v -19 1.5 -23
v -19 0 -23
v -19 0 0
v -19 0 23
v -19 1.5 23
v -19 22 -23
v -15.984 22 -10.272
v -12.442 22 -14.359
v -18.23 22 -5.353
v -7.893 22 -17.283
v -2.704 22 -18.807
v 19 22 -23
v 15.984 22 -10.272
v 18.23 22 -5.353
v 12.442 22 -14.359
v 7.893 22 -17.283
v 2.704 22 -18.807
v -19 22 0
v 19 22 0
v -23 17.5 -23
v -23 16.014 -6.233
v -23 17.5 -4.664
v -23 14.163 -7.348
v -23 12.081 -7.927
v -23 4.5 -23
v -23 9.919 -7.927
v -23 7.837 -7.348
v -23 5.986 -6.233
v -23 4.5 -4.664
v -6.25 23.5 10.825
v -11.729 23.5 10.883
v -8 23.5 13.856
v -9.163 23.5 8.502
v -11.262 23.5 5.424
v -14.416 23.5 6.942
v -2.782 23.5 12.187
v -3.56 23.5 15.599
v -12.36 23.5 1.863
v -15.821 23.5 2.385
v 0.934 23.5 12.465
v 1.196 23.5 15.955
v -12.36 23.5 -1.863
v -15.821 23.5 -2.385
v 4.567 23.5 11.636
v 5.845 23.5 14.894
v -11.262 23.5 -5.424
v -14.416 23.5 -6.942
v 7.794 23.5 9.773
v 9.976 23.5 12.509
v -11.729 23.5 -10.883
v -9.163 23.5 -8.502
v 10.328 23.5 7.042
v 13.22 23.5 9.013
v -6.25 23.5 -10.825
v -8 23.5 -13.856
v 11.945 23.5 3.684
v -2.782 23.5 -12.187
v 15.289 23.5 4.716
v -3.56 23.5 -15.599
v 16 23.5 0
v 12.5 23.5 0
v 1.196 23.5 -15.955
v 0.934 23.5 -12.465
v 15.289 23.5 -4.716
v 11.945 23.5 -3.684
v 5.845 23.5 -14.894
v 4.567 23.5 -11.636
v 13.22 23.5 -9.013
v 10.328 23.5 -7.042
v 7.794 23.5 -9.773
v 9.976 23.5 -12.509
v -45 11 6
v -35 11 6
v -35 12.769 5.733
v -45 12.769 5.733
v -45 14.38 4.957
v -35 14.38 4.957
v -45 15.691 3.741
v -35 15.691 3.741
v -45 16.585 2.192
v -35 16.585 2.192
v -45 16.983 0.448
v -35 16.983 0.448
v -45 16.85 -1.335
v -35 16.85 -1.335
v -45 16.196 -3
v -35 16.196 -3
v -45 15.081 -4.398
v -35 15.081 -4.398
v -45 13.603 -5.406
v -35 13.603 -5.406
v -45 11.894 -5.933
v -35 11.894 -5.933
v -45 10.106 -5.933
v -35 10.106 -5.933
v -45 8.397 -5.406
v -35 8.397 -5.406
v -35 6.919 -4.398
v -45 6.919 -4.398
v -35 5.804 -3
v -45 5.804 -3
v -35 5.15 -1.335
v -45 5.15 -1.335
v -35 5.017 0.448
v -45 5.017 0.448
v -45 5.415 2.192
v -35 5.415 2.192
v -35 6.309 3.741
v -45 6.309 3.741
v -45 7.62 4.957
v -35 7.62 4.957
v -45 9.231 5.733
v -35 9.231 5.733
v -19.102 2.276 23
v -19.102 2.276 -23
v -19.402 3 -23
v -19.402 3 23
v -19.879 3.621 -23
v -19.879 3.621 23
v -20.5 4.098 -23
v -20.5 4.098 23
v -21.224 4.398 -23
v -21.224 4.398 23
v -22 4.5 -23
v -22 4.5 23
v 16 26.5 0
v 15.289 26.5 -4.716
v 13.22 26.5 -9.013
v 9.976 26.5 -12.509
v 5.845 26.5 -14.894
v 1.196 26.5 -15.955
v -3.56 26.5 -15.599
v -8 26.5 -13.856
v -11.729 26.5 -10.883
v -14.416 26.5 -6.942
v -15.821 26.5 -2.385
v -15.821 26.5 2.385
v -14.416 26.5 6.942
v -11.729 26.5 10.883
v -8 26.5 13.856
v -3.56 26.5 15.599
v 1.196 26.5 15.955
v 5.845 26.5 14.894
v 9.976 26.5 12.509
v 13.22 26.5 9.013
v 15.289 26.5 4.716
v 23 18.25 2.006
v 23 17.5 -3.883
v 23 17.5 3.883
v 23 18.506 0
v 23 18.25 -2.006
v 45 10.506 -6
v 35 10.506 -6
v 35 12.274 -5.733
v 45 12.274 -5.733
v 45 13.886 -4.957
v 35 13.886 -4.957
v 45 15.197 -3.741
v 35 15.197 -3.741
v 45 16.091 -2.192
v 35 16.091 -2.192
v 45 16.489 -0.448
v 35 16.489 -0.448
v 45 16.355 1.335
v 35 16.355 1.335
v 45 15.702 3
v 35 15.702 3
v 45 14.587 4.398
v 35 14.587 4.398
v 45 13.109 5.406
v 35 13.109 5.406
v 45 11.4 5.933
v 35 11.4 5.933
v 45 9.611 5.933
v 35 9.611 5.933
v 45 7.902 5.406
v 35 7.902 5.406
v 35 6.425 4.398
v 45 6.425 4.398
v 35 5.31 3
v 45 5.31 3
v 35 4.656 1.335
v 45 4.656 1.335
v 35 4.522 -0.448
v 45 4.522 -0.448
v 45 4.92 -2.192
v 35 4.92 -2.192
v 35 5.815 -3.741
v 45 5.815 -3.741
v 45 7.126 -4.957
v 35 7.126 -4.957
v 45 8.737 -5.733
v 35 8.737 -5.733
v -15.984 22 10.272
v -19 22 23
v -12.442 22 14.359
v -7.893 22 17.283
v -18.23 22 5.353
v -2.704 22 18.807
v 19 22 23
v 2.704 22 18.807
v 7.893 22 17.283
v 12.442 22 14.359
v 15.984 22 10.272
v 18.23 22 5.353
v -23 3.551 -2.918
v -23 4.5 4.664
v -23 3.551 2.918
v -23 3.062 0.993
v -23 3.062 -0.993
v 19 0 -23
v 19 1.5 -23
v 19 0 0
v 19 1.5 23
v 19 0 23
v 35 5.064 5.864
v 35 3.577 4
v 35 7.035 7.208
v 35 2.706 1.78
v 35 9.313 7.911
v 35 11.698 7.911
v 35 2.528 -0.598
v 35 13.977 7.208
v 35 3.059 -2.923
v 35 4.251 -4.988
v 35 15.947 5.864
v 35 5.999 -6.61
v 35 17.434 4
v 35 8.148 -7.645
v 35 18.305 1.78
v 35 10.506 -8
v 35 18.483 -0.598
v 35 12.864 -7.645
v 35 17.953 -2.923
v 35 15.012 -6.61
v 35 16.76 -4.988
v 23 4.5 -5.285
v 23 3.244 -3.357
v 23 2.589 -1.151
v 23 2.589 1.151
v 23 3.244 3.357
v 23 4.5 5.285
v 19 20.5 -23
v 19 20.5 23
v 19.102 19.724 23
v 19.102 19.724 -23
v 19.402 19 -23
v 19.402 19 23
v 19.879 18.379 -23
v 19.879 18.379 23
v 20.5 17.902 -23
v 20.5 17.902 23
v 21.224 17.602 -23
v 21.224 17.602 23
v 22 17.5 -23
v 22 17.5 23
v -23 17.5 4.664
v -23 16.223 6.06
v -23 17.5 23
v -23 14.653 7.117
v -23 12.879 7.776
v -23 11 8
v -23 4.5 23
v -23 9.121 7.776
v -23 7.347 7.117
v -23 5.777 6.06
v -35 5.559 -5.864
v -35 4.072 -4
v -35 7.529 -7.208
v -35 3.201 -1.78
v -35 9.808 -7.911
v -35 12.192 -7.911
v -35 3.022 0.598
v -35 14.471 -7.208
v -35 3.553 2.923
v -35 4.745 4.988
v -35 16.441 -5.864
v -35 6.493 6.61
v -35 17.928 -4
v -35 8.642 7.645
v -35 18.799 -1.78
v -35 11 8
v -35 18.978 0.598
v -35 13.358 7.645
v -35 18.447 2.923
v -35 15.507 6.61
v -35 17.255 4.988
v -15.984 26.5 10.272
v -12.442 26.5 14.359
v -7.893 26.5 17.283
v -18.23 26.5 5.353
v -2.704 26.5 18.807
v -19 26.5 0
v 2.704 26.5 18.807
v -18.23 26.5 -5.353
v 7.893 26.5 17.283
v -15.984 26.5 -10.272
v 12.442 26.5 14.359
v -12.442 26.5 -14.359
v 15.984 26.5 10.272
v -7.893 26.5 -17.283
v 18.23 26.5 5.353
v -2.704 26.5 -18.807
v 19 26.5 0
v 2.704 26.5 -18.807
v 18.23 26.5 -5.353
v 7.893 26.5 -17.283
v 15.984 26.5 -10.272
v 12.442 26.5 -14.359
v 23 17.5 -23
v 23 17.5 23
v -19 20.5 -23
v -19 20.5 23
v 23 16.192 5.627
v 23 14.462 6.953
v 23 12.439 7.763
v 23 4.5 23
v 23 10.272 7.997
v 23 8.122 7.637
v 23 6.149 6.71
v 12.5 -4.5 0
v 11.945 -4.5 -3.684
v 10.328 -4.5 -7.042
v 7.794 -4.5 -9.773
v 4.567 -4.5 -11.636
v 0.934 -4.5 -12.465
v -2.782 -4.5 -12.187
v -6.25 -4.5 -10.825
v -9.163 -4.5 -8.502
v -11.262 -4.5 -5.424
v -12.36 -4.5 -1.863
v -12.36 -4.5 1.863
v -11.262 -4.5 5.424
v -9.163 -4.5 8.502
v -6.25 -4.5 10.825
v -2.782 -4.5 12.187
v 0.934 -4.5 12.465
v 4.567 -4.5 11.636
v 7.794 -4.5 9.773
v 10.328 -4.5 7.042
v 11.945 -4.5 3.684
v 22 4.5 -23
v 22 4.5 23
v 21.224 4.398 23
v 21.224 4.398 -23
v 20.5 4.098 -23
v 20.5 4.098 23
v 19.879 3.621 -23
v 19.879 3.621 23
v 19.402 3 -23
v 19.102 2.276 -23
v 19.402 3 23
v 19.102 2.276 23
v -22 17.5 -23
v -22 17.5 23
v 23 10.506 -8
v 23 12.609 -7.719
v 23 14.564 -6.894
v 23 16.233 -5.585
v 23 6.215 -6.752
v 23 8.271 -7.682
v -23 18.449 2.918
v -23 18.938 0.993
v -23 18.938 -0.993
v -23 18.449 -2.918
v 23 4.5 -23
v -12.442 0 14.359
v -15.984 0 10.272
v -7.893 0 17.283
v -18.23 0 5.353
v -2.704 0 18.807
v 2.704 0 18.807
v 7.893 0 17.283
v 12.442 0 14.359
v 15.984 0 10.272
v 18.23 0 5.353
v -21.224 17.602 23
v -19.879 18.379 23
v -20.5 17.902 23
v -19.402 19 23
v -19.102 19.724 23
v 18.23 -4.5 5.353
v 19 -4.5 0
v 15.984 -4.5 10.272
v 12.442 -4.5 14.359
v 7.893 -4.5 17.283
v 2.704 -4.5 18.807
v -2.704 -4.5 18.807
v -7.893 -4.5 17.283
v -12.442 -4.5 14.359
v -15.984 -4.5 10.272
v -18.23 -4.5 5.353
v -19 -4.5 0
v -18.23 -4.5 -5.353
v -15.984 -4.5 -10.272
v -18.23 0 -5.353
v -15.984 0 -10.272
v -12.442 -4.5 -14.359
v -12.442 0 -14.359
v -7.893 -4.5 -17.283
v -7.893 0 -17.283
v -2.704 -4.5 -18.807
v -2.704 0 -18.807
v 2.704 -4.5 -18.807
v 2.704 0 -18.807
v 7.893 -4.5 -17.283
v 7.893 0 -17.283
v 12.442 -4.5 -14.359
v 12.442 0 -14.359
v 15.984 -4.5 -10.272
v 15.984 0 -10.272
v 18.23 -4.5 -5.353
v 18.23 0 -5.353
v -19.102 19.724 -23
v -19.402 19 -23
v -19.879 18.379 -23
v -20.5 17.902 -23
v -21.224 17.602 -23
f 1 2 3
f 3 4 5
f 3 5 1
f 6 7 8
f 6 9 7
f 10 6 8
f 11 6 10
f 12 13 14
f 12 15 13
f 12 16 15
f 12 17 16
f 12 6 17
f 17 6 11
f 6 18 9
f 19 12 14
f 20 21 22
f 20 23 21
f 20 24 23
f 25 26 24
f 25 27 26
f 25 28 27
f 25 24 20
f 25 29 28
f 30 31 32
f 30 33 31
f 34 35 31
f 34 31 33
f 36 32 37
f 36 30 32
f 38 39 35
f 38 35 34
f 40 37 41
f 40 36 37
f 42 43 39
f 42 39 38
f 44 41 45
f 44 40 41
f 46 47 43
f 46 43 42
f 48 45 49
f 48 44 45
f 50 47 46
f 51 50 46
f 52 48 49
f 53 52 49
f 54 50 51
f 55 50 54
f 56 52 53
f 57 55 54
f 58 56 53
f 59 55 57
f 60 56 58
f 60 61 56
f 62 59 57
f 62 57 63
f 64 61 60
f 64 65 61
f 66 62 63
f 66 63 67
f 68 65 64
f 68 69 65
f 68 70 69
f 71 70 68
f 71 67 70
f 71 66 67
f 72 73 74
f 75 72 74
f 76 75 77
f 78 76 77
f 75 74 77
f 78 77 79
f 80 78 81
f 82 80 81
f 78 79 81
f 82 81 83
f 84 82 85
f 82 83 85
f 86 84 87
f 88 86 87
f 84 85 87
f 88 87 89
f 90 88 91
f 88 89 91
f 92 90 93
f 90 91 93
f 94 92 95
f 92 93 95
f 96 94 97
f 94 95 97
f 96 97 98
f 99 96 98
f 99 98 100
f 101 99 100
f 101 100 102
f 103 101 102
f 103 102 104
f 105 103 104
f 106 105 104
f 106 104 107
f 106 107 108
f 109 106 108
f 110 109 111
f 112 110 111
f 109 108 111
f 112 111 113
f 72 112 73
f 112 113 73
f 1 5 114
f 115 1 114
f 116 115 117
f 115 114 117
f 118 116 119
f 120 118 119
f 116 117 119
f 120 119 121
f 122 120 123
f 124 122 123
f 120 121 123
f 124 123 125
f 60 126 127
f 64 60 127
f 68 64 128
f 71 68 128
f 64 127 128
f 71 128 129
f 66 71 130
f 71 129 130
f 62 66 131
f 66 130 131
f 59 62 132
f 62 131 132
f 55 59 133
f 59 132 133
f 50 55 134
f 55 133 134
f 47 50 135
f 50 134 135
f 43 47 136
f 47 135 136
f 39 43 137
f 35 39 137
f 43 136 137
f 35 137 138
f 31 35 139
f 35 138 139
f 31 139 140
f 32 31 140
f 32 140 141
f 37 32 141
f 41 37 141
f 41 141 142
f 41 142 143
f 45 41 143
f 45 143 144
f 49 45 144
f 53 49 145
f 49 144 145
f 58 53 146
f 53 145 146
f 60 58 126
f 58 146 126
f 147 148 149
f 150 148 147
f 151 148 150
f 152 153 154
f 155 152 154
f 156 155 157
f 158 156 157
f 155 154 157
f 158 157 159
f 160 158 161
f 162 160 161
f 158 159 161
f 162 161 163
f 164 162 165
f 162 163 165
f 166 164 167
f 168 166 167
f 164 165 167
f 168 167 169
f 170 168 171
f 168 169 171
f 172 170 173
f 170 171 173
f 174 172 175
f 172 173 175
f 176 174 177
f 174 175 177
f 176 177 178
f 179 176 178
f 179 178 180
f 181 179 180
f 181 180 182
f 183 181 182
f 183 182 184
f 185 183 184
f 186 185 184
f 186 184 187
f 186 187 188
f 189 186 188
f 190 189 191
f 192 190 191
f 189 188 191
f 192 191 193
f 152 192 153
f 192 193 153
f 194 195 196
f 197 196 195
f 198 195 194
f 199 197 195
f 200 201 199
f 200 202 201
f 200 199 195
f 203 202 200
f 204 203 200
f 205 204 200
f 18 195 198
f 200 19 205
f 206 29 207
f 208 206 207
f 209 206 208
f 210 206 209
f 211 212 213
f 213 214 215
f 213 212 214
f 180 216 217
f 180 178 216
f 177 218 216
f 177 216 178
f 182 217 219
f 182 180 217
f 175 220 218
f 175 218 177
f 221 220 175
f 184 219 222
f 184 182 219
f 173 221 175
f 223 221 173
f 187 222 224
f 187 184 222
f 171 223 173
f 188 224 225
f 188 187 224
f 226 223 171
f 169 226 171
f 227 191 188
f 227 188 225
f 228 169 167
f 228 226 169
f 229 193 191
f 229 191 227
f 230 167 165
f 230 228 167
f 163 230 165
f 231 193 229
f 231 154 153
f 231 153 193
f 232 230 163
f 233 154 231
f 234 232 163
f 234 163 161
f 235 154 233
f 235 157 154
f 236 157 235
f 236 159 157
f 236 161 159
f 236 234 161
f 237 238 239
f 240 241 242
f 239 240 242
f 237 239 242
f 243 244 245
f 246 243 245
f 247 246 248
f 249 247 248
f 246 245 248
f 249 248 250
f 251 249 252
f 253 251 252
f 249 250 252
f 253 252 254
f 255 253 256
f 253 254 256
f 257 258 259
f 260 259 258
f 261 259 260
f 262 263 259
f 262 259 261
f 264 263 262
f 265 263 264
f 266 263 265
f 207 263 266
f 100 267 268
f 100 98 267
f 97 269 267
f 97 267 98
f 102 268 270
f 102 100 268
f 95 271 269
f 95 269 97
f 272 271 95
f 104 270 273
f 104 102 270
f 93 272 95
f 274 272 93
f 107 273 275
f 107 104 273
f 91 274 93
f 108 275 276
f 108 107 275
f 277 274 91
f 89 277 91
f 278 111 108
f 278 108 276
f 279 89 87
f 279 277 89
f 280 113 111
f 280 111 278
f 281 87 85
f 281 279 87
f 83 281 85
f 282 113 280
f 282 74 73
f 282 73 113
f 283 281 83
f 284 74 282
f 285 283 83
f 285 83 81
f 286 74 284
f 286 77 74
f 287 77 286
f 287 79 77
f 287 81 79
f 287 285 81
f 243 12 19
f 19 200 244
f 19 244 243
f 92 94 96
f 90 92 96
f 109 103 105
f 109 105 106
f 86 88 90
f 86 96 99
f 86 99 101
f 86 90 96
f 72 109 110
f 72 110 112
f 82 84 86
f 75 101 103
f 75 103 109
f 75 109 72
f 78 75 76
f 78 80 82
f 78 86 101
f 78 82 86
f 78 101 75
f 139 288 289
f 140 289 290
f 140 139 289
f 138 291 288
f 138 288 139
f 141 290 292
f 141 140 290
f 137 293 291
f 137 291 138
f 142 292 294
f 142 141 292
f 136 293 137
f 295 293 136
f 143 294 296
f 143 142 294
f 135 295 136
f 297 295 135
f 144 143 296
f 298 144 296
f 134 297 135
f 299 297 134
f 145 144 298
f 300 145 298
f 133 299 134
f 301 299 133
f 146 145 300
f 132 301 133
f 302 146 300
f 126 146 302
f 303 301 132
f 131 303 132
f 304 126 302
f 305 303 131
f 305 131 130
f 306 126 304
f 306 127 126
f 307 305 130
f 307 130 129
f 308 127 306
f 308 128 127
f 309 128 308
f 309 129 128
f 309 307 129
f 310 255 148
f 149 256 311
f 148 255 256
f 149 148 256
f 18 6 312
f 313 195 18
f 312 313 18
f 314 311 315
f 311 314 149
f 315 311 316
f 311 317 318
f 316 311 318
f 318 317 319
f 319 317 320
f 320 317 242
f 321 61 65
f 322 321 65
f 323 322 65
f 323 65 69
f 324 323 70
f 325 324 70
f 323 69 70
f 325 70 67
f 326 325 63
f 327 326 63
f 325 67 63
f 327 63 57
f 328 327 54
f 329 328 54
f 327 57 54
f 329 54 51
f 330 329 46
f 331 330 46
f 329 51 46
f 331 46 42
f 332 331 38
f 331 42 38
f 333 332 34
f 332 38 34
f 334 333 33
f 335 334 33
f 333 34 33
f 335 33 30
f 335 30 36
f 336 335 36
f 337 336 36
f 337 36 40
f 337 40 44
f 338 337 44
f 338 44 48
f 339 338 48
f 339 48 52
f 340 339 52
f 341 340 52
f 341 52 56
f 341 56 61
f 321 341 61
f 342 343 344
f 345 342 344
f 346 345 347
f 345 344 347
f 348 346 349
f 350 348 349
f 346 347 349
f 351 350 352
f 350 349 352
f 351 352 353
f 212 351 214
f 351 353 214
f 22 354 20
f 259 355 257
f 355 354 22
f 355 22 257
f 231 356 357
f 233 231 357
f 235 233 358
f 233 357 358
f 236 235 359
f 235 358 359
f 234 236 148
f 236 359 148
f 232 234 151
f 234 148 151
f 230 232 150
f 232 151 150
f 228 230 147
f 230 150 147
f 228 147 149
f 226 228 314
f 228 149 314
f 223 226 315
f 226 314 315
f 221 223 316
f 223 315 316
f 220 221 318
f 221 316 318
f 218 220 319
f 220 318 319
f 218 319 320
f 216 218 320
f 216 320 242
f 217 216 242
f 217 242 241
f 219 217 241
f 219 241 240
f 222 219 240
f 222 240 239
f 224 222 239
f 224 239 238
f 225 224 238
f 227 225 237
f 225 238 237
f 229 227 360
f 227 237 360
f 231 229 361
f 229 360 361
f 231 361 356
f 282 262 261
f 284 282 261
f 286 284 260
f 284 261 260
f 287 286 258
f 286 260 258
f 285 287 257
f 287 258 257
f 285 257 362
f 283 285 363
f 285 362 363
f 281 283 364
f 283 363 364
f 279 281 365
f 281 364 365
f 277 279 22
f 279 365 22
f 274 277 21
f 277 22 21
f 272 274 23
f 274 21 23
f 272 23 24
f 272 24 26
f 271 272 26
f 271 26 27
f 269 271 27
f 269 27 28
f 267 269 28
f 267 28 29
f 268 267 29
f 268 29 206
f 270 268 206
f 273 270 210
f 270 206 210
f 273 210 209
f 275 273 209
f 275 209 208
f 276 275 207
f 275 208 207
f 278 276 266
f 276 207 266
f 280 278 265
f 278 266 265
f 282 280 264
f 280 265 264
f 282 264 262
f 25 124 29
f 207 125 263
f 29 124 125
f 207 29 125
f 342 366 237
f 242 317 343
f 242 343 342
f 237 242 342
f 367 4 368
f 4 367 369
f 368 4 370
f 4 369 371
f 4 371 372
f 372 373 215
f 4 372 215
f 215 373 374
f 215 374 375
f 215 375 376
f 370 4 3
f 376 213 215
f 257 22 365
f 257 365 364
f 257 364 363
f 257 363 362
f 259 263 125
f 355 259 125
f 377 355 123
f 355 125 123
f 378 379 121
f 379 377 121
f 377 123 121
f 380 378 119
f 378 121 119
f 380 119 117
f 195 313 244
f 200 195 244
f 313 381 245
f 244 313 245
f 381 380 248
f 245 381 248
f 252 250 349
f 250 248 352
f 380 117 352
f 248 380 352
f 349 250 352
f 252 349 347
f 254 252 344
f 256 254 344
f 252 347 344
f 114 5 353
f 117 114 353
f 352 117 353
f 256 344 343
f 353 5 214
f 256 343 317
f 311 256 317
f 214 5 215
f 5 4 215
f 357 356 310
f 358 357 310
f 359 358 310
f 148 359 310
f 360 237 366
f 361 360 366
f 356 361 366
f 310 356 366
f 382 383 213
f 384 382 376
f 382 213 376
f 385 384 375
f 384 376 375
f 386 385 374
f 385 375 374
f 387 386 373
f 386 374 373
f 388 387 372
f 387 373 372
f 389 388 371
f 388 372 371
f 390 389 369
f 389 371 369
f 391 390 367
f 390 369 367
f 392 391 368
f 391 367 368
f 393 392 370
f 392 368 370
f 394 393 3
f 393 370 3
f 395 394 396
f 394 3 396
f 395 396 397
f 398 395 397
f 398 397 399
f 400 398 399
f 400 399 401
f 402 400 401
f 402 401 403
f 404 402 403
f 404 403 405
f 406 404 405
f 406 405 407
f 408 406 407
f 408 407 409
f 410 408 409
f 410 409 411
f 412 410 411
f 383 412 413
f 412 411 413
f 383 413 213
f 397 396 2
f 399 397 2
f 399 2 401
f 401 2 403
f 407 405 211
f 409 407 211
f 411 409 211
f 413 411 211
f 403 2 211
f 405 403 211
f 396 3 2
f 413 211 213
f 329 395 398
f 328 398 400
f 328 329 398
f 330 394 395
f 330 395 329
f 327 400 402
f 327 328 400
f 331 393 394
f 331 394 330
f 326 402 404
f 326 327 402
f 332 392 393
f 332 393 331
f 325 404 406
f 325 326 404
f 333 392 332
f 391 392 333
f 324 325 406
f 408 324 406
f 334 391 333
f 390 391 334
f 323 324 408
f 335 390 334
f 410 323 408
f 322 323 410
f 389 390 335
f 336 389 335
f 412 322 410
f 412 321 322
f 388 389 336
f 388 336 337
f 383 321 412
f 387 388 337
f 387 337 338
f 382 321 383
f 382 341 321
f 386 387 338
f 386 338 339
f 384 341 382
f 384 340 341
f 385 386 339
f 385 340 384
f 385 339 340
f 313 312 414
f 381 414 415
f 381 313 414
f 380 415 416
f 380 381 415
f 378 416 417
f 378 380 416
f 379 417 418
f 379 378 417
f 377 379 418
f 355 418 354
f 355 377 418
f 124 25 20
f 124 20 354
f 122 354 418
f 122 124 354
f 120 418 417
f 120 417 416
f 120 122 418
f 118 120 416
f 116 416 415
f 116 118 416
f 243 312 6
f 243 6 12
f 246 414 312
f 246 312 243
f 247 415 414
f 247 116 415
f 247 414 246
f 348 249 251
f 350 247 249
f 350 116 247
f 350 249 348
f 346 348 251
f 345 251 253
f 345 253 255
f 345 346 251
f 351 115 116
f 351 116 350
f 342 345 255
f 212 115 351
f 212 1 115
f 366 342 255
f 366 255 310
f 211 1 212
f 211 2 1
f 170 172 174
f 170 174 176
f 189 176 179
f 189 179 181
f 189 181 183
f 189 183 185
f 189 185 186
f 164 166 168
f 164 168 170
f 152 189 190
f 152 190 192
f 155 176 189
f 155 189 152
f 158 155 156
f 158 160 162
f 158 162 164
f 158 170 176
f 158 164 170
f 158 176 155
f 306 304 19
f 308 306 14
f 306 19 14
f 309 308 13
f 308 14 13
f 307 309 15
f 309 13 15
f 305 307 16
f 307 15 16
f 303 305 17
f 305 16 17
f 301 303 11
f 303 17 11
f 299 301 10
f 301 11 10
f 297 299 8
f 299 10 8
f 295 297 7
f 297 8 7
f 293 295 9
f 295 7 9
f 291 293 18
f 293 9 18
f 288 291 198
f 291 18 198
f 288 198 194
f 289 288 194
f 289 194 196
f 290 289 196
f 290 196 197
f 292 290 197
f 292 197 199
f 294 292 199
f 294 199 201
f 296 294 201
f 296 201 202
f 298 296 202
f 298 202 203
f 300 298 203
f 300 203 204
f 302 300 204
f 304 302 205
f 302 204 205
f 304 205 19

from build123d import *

# Parameters (mm, degrees)
SKETCH1_W           = 46
SKETCH1_H           = 46
BOSS_EXTRUDE1_DEPTH = 22
SKETCH2_R           = 19
BOSS_EXTRUDE4_DEPTH = 4.5
SKETCH5_R           = 19
BOSS_EXTRUDE5_DEPTH = 4.5
SKETCH6_R           = 16
CUT_EXTRUDE1_DEPTH  = 3
SKETCH7_R           = 12.5
CUT_EXTRUDE2_DEPTH  = 29
SKETCH8_R           = 8
BOSS_EXTRUDE6_DEPTH = 12
SKETCH9_R           = 6
BOSS_EXTRUDE7_DEPTH = 10
SKETCH10_R          = 8
BOSS_EXTRUDE8_DEPTH = 12
SKETCH11_R          = 6
BOSS_EXTRUDE9_DEPTH = 10
CUT_EXTRUDE3_DEPTH  = 47


with BuildPart() as part:
    # Sketch1 → Boss-Extrude1 (new body)
    with BuildSketch(Plane(origin=(0, 0, 0), x_dir=(1, 0, 0), z_dir=(0, 1, 0))):
        Rectangle(SKETCH1_W, SKETCH1_H)
    extrude(amount=BOSS_EXTRUDE1_DEPTH)

    # Sketch2 → Boss-Extrude4 (add)
    with BuildSketch(Plane(origin=(0, 22, 0), x_dir=(1, 0, 0), z_dir=(0, 1, 0))):
        Circle(SKETCH2_R)
    extrude(amount=BOSS_EXTRUDE4_DEPTH)

    # Sketch5 → Boss-Extrude5 (add)
    with BuildSketch(Plane.XZ):
        Circle(SKETCH5_R)
    extrude(amount=BOSS_EXTRUDE5_DEPTH)

    # Sketch6 → Cut-Extrude1 (cut)
    with BuildSketch(Plane(origin=(0, 26.5, 0), x_dir=(1, 0, 0), z_dir=(0, 1, 0))):
        Circle(SKETCH6_R)
    extrude(amount=-CUT_EXTRUDE1_DEPTH, mode=Mode.SUBTRACT)

    # Sketch7 → Cut-Extrude2 (cut, through all)
    with BuildSketch(Plane(origin=(0, 23.5, 0), x_dir=(1, 0, 0), z_dir=(0, 1, 0))):
        Circle(SKETCH7_R)
    extrude(amount=-CUT_EXTRUDE2_DEPTH, mode=Mode.SUBTRACT)

    # Sketch8 → Boss-Extrude6 (add)
    with BuildSketch(Plane(origin=(23, 0, 0), x_dir=(0, 0, -1), z_dir=(1, 0, 0))):
        with Locations((0, 10.505702785)):
            Circle(SKETCH8_R)
    extrude(amount=BOSS_EXTRUDE6_DEPTH)

    # Sketch9 → Boss-Extrude7 (add)
    with BuildSketch(Plane(origin=(35, 0, 0), x_dir=(0, 0, -1), z_dir=(1, 0, 0))):
        with Locations((0, 10.505702785)):
            Circle(SKETCH9_R)
    extrude(amount=BOSS_EXTRUDE7_DEPTH)

    # Sketch10 → Boss-Extrude8 (add)
    with BuildSketch(Plane.ZY.offset(23)):
        with Locations((0, 11)):
            Circle(SKETCH10_R)
    extrude(amount=BOSS_EXTRUDE8_DEPTH)

    # Sketch11 → Boss-Extrude9 (add)
    with BuildSketch(Plane.ZY.offset(35)):
        with Locations((0, 11)):
            Circle(SKETCH11_R)
    extrude(amount=BOSS_EXTRUDE9_DEPTH)

    # Sketch13 → Cut-Extrude3 (cut, through all)
    with BuildSketch(Plane.XY.offset(23)):
        with BuildLine():
            Line((-23, 22), (-19, 22))
            Line((-19, 22), (-19, 20.5))
            ThreePointArc((-19, 20.5), (-19.878679656, 18.378679656), (-22, 17.5))
            Line((-22, 17.5), (-23, 17.5))
            Line((-23, 17.5), (-23, 22))
        make_face()
        with BuildLine():
            Line((23, 22), (19, 22))
            Line((19, 22), (19, 20.5))
            ThreePointArc((19, 20.5), (19.878679656, 18.378679656), (22, 17.5))
            Line((22, 17.5), (23, 17.5))
            Line((23, 17.5), (23, 22))
        make_face()
        with BuildLine():
            Line((-23, 0), (-19, 0))
            Line((-19, 0), (-19, 1.5))
            ThreePointArc((-19, 1.5), (-19.878679656, 3.621320344), (-22, 4.5))
            Line((-22, 4.5), (-23, 4.5))
            Line((-23, 4.5), (-23, 0))
        make_face()
        with BuildLine():
            Line((23, 0), (23, 4.5))
            Line((23, 4.5), (22, 4.5))
            ThreePointArc((22, 4.5), (19.878679656, 3.621320344), (19, 1.5))
            Line((19, 1.5), (19, 0))
            Line((19, 0), (23, 0))
        make_face()
    extrude(amount=-CUT_EXTRUDE3_DEPTH, mode=Mode.SUBTRACT)


solid = part.part
